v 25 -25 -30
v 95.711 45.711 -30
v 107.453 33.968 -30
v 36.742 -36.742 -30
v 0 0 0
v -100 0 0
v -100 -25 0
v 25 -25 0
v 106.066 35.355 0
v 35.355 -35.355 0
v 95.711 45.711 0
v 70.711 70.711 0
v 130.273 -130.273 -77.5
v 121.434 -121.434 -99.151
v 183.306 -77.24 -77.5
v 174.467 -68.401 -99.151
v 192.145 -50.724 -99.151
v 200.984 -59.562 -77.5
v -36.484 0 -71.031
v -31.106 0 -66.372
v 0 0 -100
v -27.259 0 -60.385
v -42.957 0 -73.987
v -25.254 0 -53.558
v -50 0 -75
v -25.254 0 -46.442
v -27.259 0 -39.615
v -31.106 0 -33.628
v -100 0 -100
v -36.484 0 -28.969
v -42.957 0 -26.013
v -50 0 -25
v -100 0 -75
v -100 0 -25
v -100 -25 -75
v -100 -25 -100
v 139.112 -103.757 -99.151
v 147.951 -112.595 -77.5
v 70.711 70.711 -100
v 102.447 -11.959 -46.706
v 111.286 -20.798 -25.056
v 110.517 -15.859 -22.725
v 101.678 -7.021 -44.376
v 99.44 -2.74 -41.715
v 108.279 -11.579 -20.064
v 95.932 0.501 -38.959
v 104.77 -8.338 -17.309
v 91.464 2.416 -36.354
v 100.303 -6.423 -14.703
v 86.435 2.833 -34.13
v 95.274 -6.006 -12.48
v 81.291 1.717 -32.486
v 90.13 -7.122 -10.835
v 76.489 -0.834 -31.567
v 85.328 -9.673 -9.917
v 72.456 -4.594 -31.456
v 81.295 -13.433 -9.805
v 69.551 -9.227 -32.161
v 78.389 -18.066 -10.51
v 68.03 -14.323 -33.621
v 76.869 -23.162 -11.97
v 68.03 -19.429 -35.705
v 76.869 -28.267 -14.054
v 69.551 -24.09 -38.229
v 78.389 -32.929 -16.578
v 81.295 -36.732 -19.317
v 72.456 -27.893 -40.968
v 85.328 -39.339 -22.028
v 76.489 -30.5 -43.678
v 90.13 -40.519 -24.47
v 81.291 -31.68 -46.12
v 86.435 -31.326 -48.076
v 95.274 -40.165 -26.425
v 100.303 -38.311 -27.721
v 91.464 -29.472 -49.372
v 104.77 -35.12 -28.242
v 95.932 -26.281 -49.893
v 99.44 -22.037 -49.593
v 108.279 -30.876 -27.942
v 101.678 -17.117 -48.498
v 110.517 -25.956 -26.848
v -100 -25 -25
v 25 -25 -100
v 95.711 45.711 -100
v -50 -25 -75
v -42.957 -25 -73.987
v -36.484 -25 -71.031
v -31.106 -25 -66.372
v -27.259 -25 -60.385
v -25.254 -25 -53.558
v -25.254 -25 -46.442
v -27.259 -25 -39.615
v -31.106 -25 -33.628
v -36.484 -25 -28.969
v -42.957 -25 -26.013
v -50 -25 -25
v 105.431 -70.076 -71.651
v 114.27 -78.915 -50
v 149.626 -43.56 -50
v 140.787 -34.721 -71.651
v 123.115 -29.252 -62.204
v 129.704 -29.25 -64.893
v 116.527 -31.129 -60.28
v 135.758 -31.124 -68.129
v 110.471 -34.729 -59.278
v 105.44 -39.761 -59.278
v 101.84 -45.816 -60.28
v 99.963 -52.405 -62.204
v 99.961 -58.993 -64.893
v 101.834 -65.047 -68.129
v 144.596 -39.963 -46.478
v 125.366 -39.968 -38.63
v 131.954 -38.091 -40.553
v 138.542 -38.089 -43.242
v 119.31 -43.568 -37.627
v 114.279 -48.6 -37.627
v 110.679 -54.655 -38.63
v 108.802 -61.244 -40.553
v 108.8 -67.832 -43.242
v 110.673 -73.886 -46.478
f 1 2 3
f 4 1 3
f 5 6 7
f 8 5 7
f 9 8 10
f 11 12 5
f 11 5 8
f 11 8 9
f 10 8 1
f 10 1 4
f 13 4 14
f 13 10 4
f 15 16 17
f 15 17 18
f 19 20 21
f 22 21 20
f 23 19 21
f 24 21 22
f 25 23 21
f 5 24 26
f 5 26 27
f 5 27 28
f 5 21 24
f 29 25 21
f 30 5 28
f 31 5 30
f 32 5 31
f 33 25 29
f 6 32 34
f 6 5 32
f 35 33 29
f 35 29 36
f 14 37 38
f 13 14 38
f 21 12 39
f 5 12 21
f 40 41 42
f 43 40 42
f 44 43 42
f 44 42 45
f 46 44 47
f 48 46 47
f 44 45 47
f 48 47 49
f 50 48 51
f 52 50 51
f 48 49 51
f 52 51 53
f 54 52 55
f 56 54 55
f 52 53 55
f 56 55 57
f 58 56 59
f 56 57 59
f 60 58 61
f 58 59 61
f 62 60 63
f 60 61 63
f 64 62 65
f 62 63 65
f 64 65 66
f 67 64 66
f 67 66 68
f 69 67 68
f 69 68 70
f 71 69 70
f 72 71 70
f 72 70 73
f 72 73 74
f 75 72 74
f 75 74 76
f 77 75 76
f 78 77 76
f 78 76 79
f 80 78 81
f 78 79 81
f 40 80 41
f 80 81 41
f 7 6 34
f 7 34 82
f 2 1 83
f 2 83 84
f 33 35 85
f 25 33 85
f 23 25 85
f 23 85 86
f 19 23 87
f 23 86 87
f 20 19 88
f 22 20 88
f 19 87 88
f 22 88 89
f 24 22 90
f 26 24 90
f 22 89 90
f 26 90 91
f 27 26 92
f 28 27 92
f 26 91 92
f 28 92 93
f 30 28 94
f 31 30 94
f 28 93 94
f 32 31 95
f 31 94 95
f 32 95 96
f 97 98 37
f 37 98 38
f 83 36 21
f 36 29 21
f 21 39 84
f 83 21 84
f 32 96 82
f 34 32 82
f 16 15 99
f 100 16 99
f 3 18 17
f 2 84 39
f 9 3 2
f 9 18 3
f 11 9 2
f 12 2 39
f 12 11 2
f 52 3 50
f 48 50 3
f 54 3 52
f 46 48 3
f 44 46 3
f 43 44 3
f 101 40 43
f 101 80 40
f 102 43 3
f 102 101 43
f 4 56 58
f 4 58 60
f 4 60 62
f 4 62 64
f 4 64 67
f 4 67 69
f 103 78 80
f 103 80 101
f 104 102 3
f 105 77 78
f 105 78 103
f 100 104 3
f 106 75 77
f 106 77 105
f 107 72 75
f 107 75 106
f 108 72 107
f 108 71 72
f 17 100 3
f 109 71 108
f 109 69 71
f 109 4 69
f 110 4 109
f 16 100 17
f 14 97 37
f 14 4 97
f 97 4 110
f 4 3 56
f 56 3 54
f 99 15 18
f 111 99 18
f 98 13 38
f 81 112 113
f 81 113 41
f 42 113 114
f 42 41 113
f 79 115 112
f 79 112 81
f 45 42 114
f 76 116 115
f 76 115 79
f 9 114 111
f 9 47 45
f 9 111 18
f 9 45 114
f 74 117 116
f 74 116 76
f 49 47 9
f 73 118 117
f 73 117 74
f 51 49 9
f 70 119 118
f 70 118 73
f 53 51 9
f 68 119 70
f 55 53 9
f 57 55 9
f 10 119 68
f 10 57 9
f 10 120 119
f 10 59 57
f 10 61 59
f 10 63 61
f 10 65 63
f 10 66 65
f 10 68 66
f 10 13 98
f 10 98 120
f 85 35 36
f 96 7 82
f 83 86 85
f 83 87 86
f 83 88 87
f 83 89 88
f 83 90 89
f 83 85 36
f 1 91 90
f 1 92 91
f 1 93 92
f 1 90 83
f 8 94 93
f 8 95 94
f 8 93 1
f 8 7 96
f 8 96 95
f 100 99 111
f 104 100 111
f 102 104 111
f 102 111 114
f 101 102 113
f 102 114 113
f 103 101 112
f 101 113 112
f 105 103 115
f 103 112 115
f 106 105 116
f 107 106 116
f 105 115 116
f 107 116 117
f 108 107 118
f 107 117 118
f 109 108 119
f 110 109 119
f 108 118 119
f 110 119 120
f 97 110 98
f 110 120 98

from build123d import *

# Parameters (mm, degrees)
F4_DEPTH = 100
F5_DEPTH = 100
F7_DEPTH = 25
F8_R     = 18.5
F9_DEPTH = 25


with BuildPart() as f4:
    # F0 (on Top) → F4 (new body)
    with BuildSketch(Plane.XY):
        Polygon((-100, -25), (25, -25), (95.7106781187, 45.7106781187), (70.7106781187, 70.7106781187), (0, 0), (-100, 0), align=None)
    extrude(amount=-F4_DEPTH)

    # F3 (on 3pt) → F5 (join)
    with BuildSketch(Plane(origin=(0, 0, 0), x_dir=(0.7071067812, -0.7071067812, 0), z_dir=(-0.7071067812, -0.7071067812, 0))):
        Polygon((0, 0), (0, -30), (51.9615242271, -30), (171.7339375866, -99.1506350946), (184.2339375866, -77.5), (50, 0), align=None)
    extrude(amount=-F5_DEPTH)

    # F6 (on face) → F7 (cut, through all)
    with BuildSketch(Plane.XZ.offset(25)):
        with BuildLine():
            Line((-50, -25), (-100, -25))
            Line((-100, -25), (-100, -75))
            Line((-100, -75), (-50, -75))
            ThreePointArc((-50, -75), (-25, -50), (-50, -25))
        make_face()
    extrude(amount=-F7_DEPTH, mode=Mode.SUBTRACT)

    # F8 (on face) → F9 (cut, through all)
    with BuildSketch(Plane(origin=(8.8388347648, -8.8388347648, 21.6506350946), x_dir=(0.9354143467, 0.133630621, -0.3273268354), z_dir=(0.3535533906, -0.3535533906, 0.8660254038))):
        with Locations((91.0206222635, -28.7252999487)):
            Circle(F8_R)
        with BuildLine():
            Line((112.710926197, -91.9592363695), (148.7168780859, -133.5353284006))
            Line((148.7168780859, -133.5353284006), (186.5133253868, -100.8026448652))
            Line((186.5133253868, -100.8026448652), (150.5073734979, -59.2265528341))
            ThreePointArc((150.5073734979, -59.2265528341), (115.2428080797, -56.6946709514), (112.710926197, -91.9592363695))
        make_face()
    extrude(amount=-F9_DEPTH, mode=Mode.SUBTRACT)


solid = f4.part
